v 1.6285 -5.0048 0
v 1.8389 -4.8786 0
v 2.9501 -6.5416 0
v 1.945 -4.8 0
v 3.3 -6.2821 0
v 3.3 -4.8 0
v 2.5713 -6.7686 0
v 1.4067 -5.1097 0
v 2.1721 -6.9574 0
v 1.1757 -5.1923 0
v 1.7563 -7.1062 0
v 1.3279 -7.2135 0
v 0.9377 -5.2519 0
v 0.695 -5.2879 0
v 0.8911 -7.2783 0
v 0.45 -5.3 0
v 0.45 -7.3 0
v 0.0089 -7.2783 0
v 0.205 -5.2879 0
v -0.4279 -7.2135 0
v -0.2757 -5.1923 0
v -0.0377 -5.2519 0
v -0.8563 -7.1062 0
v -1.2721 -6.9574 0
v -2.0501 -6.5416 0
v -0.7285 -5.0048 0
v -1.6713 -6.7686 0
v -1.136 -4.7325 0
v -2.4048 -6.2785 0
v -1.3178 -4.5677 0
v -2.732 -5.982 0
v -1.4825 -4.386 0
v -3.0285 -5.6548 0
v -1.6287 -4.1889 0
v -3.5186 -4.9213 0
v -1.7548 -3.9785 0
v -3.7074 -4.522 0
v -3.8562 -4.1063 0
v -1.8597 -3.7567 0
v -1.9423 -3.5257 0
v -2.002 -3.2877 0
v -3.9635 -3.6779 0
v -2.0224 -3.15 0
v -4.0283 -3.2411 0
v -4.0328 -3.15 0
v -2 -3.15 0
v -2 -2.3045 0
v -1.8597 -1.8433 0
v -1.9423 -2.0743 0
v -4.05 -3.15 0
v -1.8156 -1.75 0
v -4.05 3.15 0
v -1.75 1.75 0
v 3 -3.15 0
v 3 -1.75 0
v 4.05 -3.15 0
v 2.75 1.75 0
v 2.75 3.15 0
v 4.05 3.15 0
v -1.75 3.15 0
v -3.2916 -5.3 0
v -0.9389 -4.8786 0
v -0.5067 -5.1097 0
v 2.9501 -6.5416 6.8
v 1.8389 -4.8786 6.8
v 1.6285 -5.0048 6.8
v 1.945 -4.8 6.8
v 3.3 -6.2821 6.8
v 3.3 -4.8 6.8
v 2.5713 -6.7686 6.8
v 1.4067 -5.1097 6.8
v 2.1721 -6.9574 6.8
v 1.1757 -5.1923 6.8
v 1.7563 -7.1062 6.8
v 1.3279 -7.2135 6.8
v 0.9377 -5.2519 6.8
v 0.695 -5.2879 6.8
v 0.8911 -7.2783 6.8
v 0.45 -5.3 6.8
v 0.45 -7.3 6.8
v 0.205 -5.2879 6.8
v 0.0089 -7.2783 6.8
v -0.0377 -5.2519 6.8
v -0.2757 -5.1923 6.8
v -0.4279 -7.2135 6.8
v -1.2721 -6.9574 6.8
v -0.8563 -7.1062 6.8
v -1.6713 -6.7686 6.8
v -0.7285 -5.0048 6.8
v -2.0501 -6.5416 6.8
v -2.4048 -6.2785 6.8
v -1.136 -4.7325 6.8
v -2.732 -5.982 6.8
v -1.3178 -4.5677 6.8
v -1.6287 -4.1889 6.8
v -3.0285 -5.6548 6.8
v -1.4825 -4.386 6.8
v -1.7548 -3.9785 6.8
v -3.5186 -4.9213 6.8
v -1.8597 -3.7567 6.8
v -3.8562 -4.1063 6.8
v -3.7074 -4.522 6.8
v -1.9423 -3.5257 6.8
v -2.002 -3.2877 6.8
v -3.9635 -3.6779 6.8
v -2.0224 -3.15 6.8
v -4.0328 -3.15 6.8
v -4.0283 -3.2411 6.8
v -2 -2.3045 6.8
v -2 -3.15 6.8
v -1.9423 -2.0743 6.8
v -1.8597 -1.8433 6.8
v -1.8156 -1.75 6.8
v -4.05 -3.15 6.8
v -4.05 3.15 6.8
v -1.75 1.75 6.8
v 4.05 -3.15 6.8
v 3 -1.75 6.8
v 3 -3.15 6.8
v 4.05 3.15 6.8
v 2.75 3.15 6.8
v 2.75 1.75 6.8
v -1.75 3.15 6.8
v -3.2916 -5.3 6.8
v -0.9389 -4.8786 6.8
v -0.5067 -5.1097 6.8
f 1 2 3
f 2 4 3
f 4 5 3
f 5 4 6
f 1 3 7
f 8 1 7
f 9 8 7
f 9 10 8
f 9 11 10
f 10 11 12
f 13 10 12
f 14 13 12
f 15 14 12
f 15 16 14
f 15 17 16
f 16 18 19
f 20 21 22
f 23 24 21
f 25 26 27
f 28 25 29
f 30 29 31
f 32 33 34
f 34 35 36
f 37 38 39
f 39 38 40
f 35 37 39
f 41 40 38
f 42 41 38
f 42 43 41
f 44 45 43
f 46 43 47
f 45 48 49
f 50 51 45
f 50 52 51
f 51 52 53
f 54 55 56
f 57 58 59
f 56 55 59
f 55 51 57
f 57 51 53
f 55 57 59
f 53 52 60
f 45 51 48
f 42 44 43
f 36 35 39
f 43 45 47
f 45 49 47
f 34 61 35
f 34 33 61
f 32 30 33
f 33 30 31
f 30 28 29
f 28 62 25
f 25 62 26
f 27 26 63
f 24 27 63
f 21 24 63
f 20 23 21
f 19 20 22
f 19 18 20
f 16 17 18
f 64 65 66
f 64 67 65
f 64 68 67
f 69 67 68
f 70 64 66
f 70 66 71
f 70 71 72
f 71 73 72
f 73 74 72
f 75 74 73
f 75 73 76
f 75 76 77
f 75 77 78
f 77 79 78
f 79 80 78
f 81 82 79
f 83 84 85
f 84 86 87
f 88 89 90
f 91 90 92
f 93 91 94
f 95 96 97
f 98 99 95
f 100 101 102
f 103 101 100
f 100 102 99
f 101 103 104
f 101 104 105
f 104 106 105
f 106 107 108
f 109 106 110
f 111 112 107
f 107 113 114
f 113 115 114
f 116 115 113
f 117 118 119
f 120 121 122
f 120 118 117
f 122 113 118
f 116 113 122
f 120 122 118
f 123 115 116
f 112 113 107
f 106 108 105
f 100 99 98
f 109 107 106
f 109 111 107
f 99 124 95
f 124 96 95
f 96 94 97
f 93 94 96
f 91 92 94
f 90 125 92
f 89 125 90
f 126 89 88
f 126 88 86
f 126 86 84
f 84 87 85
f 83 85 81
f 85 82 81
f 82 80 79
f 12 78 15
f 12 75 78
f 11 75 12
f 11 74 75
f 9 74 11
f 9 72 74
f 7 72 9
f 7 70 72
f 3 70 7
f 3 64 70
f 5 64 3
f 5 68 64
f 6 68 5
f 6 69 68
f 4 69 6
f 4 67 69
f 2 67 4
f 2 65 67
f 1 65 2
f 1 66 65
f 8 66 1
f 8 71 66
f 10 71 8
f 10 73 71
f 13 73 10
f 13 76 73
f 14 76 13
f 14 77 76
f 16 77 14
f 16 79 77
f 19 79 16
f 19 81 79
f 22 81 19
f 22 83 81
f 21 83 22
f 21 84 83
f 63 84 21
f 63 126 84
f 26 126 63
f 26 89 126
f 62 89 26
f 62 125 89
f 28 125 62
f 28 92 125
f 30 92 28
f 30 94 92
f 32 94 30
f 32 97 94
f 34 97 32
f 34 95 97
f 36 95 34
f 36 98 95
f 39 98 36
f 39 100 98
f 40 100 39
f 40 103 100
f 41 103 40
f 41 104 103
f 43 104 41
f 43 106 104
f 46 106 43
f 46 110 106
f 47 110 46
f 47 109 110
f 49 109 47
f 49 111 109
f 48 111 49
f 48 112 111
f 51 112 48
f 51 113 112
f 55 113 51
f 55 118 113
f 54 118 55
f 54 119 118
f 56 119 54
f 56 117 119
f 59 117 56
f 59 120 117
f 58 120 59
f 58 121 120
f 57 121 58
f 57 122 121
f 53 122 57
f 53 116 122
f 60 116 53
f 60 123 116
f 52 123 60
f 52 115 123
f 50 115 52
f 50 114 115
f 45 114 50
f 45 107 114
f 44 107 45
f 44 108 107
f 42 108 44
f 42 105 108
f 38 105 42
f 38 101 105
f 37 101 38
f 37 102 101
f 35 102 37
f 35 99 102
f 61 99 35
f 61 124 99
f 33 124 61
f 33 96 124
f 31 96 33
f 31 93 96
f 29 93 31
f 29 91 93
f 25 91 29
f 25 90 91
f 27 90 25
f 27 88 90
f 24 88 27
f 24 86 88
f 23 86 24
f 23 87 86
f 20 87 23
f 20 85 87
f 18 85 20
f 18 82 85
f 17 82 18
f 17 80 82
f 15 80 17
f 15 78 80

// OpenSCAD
/* = flexible stovetop spacer
 * parts: spacer
 * units: mm
 *
 * * * * *
 *
 * Designed by Daniel Oaks <https://danieloaks.net>.
 *
 * To the extent possible under law, the person who associated CC0 with
 * this file and design has waived all copyright and related or
 * neighboring rights to this file and design.
 * You should have received a copy of the CC0 legalcode along with this
 * work.  If not, see <http://creativecommons.org/publicdomain/zero/1.0/>.
 *
 * * * * *
 *
 *  Little spacer for our stovetop. Ours is missing a few.
 *
 * * * * */

// How detailed should curves be?
Detail_level = 4;
$fn=16 * Detail_level;

linear_extrude(height = 6.8)
union() {
    difference() {
        square([8.1, 6.3], center=true);
        translate([0.5,3.75,0]) square([4.5, 4], center=true);
        translate([0.5,-3.75,0]) square([5, 4], center=true);
    }
    translate([0,0.2,0]) difference() {
        translate([0.45,-3,0]) circle(d=9);
        translate([0.45,-3,0]) circle(d=5);
        translate([3,-2.5,0]) square([5,5], center=true);
        translate([5.8,-4.5,0]) square([5,5], center=true);
    }
}
